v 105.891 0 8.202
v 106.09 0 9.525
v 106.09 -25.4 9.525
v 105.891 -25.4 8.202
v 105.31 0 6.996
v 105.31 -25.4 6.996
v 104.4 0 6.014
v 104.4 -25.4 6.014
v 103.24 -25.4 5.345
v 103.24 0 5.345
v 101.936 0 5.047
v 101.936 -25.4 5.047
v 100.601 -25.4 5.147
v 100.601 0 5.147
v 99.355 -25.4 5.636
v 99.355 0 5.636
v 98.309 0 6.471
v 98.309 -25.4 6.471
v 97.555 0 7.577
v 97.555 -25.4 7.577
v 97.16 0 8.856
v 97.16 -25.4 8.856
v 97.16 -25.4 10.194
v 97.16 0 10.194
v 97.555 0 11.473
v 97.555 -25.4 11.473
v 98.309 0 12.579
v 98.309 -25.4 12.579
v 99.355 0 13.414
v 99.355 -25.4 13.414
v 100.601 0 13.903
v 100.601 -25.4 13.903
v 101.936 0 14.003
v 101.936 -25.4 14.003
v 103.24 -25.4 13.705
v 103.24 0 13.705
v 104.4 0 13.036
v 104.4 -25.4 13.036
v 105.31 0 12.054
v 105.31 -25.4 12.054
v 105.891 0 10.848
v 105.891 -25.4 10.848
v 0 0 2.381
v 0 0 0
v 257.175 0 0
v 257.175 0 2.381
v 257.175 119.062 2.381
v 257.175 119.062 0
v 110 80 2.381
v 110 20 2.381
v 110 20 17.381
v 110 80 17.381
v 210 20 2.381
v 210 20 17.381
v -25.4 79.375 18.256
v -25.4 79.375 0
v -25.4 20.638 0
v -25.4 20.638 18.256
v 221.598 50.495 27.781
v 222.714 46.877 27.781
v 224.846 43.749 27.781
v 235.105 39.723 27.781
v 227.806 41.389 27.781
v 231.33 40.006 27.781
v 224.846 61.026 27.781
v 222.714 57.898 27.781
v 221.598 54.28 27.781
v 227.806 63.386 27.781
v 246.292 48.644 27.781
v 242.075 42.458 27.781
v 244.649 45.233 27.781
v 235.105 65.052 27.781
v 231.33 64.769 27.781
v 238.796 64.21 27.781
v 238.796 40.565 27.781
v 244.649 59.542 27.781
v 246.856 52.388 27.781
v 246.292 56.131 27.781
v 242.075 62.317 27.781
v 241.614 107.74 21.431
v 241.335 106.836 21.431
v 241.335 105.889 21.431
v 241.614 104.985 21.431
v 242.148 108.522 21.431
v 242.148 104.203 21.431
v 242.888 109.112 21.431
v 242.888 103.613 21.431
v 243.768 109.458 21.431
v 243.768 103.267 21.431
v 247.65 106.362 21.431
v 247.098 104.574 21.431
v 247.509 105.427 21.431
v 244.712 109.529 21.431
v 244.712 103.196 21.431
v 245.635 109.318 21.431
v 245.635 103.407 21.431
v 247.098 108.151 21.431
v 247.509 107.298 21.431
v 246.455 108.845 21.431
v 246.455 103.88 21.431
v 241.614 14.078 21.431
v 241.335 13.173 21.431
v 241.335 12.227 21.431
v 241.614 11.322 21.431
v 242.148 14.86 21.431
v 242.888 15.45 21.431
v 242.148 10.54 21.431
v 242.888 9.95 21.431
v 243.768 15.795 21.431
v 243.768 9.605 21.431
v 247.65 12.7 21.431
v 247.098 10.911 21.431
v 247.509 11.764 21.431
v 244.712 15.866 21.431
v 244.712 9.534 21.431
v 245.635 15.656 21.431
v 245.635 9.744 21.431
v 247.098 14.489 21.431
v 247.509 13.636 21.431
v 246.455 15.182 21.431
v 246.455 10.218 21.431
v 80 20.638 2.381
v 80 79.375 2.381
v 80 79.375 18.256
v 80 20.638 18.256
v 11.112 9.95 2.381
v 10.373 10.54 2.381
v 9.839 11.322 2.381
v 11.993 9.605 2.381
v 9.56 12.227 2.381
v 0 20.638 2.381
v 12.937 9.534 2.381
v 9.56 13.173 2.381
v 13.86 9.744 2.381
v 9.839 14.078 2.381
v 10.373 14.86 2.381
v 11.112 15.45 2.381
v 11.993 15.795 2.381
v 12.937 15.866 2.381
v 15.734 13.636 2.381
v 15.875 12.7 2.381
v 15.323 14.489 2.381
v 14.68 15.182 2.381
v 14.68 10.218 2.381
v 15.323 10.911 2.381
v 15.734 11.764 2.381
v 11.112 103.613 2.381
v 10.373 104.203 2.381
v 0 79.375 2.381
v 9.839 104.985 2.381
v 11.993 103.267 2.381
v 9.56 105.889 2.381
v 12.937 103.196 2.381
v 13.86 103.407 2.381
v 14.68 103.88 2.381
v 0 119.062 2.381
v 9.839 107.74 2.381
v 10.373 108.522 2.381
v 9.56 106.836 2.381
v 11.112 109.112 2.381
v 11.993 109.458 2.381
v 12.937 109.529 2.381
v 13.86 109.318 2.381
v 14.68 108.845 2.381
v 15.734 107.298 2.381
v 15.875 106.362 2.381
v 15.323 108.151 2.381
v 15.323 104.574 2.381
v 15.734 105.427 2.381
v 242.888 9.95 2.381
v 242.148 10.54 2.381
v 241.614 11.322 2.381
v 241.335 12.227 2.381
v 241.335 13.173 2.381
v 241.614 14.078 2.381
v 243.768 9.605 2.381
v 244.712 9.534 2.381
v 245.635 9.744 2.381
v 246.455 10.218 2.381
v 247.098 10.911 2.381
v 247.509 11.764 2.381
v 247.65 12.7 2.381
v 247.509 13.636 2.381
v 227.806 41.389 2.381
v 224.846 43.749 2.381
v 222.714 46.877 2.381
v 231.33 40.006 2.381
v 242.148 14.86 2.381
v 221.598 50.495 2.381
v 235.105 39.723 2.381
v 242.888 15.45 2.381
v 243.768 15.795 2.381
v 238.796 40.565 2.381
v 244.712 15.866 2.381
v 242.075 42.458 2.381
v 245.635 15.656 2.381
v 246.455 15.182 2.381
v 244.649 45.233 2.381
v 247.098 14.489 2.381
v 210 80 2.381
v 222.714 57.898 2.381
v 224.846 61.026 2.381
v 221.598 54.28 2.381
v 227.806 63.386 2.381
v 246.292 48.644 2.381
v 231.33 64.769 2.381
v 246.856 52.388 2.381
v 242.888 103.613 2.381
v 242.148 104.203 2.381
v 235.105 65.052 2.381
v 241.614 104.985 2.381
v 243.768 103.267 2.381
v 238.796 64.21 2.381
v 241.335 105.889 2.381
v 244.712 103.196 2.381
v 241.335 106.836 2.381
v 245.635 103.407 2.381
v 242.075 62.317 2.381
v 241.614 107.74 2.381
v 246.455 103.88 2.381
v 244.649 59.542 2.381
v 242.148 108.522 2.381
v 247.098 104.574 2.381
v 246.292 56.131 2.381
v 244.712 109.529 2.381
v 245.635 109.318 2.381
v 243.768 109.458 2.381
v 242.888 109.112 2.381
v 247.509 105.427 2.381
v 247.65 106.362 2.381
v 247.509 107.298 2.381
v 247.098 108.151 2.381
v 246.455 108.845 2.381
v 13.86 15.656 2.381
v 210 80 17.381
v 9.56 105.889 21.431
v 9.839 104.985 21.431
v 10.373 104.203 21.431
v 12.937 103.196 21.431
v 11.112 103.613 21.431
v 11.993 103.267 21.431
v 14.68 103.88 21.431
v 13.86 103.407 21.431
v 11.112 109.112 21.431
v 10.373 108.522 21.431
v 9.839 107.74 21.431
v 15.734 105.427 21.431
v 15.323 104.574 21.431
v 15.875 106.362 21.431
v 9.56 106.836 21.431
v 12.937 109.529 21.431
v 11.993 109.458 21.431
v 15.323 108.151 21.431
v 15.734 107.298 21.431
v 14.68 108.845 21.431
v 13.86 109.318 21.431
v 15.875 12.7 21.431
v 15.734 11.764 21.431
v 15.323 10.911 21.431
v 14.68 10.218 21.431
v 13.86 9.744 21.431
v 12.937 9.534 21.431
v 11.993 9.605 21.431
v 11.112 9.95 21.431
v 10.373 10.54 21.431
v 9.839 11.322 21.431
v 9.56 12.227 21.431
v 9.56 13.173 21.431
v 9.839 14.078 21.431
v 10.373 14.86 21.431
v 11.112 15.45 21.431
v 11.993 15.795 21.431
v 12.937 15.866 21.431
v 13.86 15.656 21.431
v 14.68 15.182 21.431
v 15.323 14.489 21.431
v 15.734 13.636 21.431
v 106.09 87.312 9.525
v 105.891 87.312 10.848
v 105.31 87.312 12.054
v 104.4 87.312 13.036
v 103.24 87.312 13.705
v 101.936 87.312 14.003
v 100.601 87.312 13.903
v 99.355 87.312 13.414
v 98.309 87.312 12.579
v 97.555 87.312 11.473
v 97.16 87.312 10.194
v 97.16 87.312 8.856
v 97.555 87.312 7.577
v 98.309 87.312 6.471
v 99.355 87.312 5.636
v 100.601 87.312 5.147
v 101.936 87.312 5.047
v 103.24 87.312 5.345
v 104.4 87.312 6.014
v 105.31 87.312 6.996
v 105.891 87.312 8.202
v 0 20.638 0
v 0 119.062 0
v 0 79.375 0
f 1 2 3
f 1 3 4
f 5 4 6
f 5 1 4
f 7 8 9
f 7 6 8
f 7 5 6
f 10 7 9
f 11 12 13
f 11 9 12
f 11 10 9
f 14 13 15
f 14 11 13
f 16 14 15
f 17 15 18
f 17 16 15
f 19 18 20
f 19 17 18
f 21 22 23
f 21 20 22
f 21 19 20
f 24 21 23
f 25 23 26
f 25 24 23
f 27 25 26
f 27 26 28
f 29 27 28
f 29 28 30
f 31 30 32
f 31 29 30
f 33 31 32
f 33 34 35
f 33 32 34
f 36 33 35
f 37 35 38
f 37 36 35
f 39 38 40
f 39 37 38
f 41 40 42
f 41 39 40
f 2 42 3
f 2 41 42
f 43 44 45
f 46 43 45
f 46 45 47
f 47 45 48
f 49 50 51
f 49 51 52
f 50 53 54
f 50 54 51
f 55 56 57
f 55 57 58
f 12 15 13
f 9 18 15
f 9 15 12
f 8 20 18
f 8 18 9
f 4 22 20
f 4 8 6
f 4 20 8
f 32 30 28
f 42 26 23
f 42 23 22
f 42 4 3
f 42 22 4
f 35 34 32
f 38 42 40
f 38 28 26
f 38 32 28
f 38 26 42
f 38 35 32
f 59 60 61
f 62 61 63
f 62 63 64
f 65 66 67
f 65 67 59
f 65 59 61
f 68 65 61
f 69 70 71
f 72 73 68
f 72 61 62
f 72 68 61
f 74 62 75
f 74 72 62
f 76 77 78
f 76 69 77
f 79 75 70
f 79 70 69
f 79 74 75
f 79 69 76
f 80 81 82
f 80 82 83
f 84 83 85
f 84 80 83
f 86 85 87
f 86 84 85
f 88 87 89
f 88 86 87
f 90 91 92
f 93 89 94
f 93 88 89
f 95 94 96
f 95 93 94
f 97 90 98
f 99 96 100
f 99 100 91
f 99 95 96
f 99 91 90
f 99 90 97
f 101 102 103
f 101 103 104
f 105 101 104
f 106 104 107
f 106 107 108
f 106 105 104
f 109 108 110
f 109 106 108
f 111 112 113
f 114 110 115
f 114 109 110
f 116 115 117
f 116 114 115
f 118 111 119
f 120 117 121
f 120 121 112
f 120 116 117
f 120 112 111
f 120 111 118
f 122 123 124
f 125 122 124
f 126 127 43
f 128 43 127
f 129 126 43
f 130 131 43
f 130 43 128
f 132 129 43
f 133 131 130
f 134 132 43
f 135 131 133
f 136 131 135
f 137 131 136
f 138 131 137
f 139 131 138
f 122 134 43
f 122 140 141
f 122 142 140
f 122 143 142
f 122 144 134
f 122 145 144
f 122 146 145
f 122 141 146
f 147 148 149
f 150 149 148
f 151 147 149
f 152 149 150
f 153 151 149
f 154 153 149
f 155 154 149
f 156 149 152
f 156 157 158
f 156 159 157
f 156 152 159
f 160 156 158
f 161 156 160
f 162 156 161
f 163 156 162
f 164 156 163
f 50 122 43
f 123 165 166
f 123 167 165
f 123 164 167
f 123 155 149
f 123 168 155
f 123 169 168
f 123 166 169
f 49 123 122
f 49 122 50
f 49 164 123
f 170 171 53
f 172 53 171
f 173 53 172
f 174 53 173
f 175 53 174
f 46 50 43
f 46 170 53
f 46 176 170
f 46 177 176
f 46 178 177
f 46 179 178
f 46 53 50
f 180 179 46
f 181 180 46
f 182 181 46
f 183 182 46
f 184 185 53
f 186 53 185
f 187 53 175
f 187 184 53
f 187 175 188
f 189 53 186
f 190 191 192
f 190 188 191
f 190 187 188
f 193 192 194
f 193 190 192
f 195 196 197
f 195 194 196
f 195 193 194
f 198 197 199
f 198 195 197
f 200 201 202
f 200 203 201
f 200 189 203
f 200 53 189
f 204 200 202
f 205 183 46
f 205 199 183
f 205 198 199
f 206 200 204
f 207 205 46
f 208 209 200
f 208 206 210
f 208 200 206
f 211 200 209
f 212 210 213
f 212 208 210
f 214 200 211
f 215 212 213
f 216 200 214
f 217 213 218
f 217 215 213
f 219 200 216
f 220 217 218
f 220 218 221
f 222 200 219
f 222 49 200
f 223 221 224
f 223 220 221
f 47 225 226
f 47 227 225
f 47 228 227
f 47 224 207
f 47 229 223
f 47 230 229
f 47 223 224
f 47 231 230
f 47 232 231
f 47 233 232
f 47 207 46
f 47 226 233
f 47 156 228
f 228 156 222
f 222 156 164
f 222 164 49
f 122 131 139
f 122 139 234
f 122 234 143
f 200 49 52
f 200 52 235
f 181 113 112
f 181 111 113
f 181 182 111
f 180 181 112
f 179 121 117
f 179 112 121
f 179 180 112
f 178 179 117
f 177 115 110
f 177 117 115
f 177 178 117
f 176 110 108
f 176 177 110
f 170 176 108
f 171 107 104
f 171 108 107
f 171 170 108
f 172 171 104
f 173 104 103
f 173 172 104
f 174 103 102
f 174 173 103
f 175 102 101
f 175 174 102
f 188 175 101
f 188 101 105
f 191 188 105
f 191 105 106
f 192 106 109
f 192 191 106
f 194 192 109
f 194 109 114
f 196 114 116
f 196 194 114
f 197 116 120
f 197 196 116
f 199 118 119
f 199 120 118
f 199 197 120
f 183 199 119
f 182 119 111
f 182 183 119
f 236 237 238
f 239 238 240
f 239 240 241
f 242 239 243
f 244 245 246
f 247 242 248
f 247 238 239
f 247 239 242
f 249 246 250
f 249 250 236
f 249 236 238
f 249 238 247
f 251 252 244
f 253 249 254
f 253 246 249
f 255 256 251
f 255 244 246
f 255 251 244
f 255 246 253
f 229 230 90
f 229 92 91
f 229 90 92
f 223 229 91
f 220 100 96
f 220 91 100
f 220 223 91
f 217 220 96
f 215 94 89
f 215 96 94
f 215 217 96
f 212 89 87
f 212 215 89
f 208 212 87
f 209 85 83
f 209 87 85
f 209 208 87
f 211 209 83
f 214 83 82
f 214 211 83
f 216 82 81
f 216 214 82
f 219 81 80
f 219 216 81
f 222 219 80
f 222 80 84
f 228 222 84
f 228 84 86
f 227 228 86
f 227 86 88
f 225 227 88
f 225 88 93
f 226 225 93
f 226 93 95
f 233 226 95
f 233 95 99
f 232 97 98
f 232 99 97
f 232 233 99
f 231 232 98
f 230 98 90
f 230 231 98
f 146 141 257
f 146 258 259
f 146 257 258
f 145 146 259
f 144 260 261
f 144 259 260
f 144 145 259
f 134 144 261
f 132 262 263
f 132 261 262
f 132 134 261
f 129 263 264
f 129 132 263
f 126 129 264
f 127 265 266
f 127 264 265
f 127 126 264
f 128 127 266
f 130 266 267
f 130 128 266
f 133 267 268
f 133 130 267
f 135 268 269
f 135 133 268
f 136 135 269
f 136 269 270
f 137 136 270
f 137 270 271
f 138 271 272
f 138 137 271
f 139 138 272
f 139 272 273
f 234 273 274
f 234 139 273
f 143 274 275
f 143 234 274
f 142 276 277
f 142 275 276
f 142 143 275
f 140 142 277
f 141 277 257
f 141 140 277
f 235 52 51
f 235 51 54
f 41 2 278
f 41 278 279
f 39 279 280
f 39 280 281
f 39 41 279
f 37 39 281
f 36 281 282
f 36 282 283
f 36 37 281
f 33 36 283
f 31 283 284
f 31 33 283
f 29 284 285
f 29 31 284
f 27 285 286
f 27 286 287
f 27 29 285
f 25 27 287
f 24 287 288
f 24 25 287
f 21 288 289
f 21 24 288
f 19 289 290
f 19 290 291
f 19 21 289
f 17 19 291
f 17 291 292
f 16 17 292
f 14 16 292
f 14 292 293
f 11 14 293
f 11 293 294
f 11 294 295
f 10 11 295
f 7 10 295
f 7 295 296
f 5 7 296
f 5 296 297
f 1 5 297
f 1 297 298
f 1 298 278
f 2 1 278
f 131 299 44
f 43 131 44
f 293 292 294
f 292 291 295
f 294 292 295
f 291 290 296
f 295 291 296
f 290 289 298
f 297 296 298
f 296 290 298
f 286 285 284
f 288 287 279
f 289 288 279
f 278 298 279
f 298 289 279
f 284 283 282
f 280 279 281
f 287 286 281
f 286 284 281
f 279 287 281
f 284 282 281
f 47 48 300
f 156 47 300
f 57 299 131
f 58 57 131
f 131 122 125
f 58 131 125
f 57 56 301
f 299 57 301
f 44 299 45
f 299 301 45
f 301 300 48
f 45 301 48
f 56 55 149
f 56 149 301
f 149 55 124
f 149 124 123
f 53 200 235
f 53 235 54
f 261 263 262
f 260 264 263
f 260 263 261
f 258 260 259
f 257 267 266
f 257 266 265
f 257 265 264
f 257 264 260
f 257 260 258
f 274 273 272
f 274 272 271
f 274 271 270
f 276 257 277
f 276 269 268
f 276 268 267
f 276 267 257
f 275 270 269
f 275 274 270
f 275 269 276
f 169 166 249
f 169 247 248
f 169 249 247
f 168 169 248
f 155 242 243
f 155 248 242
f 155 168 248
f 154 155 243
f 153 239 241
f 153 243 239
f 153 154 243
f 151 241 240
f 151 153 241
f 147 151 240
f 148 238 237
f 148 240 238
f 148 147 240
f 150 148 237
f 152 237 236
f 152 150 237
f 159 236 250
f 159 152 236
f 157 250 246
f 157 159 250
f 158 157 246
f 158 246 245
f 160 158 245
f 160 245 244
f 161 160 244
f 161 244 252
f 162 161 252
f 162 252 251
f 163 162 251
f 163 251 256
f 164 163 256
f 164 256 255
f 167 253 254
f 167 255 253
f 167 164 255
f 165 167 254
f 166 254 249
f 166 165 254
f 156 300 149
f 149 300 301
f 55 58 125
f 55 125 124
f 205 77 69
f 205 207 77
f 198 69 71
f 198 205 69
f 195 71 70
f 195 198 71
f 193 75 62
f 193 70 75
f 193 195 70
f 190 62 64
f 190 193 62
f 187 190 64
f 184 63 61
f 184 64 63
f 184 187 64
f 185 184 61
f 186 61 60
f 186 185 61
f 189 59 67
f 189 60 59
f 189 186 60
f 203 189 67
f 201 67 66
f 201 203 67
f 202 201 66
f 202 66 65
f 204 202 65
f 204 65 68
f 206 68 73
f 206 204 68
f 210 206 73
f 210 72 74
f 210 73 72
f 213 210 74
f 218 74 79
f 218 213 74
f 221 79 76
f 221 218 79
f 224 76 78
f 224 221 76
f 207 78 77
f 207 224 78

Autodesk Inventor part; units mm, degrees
ref_plane "YZ Plane" through (0, 0, 0) normal (1, 0, 0) x (0, 1, 0)
ref_plane "XZ Plane" through (0, 0, 0) normal (0, 1, 0) x (-1, 0, 0)
ref_plane "XY Plane" through (0, 0, 0) normal (0, 0, 1) x (1, 0, 0)
sketch "Sketch1" plane through (0, 0, 0) normal (0, 0, 1) x (1, 0, 0)
  line L0 (0, 0) -> (257.175, 0)
  line L1 (257.175, 0) -> (257.175, 119.0625)
  line L2 (257.175, 119.0625) -> (0, 119.0625)
  line L3 (0, 119.0625) -> (0, 0)
  dimension "d0" = 257.175
  dimension "d1" = 119.0625
extrude "Extrusion1" add sketch "Sketch1" along normal blind 2.3813
sketch "Sketch2" plane through (0, 0, 2.3813) normal (0, 0, 1) x (1, 0, 0)
  circle A0 centre (12.7, 106.3625) radius 3.175
  circle A1 centre (244.475, 106.3625) radius 3.175
  circle A2 centre (244.475, 12.7) radius 3.175
  circle A3 centre (12.7, 12.7) radius 3.175
  line L0 (0, 0) -> (257.175, 0) projected
  line L1 (0, 119.0625) -> (0, 0) projected
  line L2 (257.175, 119.0625) -> (0, 119.0625) projected
  line L3 (257.175, 0) -> (257.175, 119.0625) projected
  dimension "d4" = 6.35
  dimension "d5" = 6.35
  dimension "d6" = 6.35
  dimension "d7" = 6.35
  dimension "d8" = 12.7
  dimension "d9" = 12.7
  dimension "d10" = 12.7
  dimension "d11" = 12.7
  dimension "d12" = 12.7
  dimension "d13" = 12.7
  dimension "d14" = 12.7
  dimension "d15" = 12.7
extrude "Clearance Distance" add sketch "Sketch2" along normal blind 19.05 contours A0 | A1 | A2 | A3
sketch "Sketch3" plane through (0, 0, 0) normal (-1, 0, 0) x (0, 0, 1)
  line L0 (0, 119.0625) -> (0, 0) projected
  line L1 (0, 20.6375) -> (18.2563, 20.6375)
  line L2 (18.2563, 20.6375) -> (18.2562, 79.375)
  line L3 (18.2562, 79.375) -> (0, 79.375)
  line L4 (0, 79.375) -> (0, 20.6375)
  line L5 (0, 119.0625) -> (2.3813, 119.0625) projected
  point P0 (0, 79.375)
  dimension "d18" = 18.2563
  dimension "d19" = 39.6875
  dimension "d20" = 98.425
extrude "Extrusion3" add sketch "Sketch3" along normal blind 25.4 and the other way blind 80
sketch "Sketch4" plane through (0, 0, 2.3813) normal (0, 0, 1) x (1, 0, 0)
  circle A0 centre (234.1562, 52.3875) radius 12.7
  line L0 (257.175, 119.0625) -> (0, 119.0625) projected
  line L1 (257.175, 0) -> (257.175, 119.0625) projected
  point P0 (0, 0)
  dimension "d25" = 25.4
  dimension "d26" = 66.675
  dimension "d27" = 23.0188
extrude "Extrusion4" add sketch "Sketch4" along normal blind 25.4
sketch "Sketch6" plane through (0, 0, 0) normal (0, -1, 0) x (1, 0, 0)
  circle A0 centre (101.6, 9.525) radius 4.4901
  line L0 (0, 0) -> (0, 2.3813) projected
  dimension "d30" = 101.6
extrude "Extrusion5" add sketch "Sketch6" along normal blind 25.4 and the other way blind 87.3125
sketch "Sketch7" plane through (0, 0, 2.3813) normal (0, 0, 1) x (1, 0, 0)
  line L0 (110, 80) -> (210, 80)
  line L1 (210, 80) -> (210, 20)
  line L2 (210, 20) -> (110, 20)
  line L3 (110, 20) -> (110, 80)
  line L4 (0, 119.0625) -> (0, 79.375) projected
  line L5 (0, 20.6375) -> (0, 0) projected
  line L6 (0, 0) -> (257.175, 0) projected
  dimension "d35" = 110
  dimension "d36" = 210
  dimension "d37" = 20
  dimension "d38" = 80
extrude "Extrusion6" add sketch "Sketch7" along normal blind 15
properties part number "Circuit Board Mockup"
